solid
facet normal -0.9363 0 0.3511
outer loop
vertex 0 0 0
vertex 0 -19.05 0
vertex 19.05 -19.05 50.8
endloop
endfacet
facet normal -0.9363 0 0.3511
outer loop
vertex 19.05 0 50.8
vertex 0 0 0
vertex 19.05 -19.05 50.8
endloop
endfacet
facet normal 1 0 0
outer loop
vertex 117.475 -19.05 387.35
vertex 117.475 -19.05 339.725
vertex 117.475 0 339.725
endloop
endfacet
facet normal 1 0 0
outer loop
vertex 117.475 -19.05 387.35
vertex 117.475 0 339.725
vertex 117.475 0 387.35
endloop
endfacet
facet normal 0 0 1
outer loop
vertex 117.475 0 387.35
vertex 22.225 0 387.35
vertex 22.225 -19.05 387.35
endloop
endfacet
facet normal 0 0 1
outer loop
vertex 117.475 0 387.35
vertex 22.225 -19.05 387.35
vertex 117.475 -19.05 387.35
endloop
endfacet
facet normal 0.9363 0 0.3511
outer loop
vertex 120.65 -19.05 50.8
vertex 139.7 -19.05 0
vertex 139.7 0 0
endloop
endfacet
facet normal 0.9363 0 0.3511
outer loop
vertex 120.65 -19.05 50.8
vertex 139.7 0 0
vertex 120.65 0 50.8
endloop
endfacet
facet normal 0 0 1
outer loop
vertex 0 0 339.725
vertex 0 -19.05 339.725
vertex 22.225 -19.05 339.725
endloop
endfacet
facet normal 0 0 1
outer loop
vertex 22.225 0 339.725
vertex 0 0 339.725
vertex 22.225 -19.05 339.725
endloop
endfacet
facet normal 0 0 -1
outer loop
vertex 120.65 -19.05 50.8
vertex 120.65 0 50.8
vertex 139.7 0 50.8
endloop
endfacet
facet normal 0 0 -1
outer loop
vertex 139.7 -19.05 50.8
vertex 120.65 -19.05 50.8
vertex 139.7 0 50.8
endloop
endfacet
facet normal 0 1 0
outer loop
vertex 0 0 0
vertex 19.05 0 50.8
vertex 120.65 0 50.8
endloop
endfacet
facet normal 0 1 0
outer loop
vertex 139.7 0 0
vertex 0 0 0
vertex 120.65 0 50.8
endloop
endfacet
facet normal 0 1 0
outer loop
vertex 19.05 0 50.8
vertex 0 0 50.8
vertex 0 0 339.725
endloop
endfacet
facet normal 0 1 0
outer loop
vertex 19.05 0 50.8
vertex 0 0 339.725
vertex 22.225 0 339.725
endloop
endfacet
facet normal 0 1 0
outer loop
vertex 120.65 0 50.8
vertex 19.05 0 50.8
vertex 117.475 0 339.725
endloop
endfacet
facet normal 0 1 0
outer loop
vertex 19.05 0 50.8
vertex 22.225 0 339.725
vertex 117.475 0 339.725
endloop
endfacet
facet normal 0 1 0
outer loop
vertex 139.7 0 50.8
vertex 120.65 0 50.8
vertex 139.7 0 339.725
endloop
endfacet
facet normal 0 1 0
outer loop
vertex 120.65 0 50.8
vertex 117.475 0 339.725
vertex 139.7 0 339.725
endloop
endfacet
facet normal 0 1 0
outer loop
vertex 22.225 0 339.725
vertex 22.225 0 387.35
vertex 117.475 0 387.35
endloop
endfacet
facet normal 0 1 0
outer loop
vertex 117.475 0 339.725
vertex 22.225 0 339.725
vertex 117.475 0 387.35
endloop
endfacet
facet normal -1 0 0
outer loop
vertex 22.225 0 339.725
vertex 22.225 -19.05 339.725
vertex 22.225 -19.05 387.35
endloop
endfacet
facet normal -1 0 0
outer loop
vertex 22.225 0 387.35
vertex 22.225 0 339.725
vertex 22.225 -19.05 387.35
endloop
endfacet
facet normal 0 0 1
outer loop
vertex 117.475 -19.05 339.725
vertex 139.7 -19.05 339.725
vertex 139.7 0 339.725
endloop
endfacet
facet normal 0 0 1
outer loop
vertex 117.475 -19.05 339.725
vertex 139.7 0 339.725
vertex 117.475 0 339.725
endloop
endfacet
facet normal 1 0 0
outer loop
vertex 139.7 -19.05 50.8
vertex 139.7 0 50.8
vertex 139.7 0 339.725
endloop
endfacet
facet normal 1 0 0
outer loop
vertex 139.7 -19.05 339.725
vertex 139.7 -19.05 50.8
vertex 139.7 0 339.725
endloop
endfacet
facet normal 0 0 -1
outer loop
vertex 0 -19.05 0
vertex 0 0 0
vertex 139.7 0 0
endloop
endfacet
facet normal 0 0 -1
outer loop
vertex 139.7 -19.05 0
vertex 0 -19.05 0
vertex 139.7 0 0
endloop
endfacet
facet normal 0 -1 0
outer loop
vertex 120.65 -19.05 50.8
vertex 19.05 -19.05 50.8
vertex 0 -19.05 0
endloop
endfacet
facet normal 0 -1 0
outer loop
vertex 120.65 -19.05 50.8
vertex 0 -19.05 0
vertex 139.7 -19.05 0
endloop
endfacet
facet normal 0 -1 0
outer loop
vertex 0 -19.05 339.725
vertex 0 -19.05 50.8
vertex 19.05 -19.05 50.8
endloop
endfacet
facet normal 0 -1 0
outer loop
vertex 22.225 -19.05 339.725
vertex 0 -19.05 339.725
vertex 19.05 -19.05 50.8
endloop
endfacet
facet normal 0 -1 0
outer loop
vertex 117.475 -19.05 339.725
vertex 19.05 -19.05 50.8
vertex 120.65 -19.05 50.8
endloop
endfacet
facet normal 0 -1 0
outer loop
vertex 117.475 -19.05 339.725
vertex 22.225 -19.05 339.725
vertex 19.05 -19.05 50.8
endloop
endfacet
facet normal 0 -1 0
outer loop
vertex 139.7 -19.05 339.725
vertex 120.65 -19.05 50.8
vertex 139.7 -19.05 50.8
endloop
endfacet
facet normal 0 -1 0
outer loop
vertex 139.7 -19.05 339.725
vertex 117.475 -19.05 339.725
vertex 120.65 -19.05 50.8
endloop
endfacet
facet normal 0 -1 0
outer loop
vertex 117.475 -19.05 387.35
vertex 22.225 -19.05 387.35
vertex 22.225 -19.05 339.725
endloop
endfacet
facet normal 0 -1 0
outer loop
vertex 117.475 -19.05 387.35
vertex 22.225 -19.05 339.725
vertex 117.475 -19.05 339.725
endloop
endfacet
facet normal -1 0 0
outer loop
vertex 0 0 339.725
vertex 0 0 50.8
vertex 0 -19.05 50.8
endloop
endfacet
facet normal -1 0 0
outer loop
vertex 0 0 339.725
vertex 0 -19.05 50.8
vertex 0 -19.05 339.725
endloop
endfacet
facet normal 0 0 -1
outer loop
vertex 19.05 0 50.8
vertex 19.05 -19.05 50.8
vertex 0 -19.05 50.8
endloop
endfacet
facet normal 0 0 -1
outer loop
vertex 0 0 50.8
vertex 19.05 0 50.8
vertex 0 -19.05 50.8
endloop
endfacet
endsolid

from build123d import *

# Parameters (mm, degrees)
F0_W     = 139.7
F0_H     = 387.35
F1_DEPTH = 19.05
F2_W     = 22.225
F2_H     = 47.625
F3_DEPTH = 19.051
F6_DEPTH = 19.051


# Not quite as in the source:
# - a length typed as a fraction of an inch, garbled in the dataset ("3 / 203.2 mm" for 3/8 in), is restored
# - a pattern or mirror of a feature is missing from the dataset's text; its kind, count and spacing are read off the source's solid


with BuildPart() as f1:
    # F0 (on Front) → F1 (new body)
    with BuildSketch(Plane.XZ):
        with Locations((69.85, 193.675)):
            Rectangle(F0_W, F0_H)
    extrude(amount=F1_DEPTH)

    # F2 (on face) → F3 (cut, through all)
    with BuildSketch(Plane.XZ.offset(19.05)):
        with Locations((11.1125, 363.5375)):
            Rectangle(F2_W, F2_H)
    f3 = extrude(amount=-F3_DEPTH, mode=Mode.SUBTRACT)

    # F3_copies: F3 across plane
    add(f3.mirror(Plane(origin=(69.85, 0, 0), x_dir=(0, 0, 1), z_dir=(1, 0, 0))), mode=Mode.SUBTRACT)

    # F5 (on face) → F6 (cut, through all)
    with BuildSketch(Plane.XZ.offset(19.05)):
        Polygon((0, 50.8), (0, 0), (19.05, 50.8), align=None)
    f6 = extrude(amount=-F6_DEPTH, mode=Mode.SUBTRACT)

    # F6_copies: F6 across plane
    add(f6.mirror(Plane(origin=(69.85, 0, 0), x_dir=(0, 0, 1), z_dir=(1, 0, 0))), mode=Mode.SUBTRACT)


solid = f1.part
